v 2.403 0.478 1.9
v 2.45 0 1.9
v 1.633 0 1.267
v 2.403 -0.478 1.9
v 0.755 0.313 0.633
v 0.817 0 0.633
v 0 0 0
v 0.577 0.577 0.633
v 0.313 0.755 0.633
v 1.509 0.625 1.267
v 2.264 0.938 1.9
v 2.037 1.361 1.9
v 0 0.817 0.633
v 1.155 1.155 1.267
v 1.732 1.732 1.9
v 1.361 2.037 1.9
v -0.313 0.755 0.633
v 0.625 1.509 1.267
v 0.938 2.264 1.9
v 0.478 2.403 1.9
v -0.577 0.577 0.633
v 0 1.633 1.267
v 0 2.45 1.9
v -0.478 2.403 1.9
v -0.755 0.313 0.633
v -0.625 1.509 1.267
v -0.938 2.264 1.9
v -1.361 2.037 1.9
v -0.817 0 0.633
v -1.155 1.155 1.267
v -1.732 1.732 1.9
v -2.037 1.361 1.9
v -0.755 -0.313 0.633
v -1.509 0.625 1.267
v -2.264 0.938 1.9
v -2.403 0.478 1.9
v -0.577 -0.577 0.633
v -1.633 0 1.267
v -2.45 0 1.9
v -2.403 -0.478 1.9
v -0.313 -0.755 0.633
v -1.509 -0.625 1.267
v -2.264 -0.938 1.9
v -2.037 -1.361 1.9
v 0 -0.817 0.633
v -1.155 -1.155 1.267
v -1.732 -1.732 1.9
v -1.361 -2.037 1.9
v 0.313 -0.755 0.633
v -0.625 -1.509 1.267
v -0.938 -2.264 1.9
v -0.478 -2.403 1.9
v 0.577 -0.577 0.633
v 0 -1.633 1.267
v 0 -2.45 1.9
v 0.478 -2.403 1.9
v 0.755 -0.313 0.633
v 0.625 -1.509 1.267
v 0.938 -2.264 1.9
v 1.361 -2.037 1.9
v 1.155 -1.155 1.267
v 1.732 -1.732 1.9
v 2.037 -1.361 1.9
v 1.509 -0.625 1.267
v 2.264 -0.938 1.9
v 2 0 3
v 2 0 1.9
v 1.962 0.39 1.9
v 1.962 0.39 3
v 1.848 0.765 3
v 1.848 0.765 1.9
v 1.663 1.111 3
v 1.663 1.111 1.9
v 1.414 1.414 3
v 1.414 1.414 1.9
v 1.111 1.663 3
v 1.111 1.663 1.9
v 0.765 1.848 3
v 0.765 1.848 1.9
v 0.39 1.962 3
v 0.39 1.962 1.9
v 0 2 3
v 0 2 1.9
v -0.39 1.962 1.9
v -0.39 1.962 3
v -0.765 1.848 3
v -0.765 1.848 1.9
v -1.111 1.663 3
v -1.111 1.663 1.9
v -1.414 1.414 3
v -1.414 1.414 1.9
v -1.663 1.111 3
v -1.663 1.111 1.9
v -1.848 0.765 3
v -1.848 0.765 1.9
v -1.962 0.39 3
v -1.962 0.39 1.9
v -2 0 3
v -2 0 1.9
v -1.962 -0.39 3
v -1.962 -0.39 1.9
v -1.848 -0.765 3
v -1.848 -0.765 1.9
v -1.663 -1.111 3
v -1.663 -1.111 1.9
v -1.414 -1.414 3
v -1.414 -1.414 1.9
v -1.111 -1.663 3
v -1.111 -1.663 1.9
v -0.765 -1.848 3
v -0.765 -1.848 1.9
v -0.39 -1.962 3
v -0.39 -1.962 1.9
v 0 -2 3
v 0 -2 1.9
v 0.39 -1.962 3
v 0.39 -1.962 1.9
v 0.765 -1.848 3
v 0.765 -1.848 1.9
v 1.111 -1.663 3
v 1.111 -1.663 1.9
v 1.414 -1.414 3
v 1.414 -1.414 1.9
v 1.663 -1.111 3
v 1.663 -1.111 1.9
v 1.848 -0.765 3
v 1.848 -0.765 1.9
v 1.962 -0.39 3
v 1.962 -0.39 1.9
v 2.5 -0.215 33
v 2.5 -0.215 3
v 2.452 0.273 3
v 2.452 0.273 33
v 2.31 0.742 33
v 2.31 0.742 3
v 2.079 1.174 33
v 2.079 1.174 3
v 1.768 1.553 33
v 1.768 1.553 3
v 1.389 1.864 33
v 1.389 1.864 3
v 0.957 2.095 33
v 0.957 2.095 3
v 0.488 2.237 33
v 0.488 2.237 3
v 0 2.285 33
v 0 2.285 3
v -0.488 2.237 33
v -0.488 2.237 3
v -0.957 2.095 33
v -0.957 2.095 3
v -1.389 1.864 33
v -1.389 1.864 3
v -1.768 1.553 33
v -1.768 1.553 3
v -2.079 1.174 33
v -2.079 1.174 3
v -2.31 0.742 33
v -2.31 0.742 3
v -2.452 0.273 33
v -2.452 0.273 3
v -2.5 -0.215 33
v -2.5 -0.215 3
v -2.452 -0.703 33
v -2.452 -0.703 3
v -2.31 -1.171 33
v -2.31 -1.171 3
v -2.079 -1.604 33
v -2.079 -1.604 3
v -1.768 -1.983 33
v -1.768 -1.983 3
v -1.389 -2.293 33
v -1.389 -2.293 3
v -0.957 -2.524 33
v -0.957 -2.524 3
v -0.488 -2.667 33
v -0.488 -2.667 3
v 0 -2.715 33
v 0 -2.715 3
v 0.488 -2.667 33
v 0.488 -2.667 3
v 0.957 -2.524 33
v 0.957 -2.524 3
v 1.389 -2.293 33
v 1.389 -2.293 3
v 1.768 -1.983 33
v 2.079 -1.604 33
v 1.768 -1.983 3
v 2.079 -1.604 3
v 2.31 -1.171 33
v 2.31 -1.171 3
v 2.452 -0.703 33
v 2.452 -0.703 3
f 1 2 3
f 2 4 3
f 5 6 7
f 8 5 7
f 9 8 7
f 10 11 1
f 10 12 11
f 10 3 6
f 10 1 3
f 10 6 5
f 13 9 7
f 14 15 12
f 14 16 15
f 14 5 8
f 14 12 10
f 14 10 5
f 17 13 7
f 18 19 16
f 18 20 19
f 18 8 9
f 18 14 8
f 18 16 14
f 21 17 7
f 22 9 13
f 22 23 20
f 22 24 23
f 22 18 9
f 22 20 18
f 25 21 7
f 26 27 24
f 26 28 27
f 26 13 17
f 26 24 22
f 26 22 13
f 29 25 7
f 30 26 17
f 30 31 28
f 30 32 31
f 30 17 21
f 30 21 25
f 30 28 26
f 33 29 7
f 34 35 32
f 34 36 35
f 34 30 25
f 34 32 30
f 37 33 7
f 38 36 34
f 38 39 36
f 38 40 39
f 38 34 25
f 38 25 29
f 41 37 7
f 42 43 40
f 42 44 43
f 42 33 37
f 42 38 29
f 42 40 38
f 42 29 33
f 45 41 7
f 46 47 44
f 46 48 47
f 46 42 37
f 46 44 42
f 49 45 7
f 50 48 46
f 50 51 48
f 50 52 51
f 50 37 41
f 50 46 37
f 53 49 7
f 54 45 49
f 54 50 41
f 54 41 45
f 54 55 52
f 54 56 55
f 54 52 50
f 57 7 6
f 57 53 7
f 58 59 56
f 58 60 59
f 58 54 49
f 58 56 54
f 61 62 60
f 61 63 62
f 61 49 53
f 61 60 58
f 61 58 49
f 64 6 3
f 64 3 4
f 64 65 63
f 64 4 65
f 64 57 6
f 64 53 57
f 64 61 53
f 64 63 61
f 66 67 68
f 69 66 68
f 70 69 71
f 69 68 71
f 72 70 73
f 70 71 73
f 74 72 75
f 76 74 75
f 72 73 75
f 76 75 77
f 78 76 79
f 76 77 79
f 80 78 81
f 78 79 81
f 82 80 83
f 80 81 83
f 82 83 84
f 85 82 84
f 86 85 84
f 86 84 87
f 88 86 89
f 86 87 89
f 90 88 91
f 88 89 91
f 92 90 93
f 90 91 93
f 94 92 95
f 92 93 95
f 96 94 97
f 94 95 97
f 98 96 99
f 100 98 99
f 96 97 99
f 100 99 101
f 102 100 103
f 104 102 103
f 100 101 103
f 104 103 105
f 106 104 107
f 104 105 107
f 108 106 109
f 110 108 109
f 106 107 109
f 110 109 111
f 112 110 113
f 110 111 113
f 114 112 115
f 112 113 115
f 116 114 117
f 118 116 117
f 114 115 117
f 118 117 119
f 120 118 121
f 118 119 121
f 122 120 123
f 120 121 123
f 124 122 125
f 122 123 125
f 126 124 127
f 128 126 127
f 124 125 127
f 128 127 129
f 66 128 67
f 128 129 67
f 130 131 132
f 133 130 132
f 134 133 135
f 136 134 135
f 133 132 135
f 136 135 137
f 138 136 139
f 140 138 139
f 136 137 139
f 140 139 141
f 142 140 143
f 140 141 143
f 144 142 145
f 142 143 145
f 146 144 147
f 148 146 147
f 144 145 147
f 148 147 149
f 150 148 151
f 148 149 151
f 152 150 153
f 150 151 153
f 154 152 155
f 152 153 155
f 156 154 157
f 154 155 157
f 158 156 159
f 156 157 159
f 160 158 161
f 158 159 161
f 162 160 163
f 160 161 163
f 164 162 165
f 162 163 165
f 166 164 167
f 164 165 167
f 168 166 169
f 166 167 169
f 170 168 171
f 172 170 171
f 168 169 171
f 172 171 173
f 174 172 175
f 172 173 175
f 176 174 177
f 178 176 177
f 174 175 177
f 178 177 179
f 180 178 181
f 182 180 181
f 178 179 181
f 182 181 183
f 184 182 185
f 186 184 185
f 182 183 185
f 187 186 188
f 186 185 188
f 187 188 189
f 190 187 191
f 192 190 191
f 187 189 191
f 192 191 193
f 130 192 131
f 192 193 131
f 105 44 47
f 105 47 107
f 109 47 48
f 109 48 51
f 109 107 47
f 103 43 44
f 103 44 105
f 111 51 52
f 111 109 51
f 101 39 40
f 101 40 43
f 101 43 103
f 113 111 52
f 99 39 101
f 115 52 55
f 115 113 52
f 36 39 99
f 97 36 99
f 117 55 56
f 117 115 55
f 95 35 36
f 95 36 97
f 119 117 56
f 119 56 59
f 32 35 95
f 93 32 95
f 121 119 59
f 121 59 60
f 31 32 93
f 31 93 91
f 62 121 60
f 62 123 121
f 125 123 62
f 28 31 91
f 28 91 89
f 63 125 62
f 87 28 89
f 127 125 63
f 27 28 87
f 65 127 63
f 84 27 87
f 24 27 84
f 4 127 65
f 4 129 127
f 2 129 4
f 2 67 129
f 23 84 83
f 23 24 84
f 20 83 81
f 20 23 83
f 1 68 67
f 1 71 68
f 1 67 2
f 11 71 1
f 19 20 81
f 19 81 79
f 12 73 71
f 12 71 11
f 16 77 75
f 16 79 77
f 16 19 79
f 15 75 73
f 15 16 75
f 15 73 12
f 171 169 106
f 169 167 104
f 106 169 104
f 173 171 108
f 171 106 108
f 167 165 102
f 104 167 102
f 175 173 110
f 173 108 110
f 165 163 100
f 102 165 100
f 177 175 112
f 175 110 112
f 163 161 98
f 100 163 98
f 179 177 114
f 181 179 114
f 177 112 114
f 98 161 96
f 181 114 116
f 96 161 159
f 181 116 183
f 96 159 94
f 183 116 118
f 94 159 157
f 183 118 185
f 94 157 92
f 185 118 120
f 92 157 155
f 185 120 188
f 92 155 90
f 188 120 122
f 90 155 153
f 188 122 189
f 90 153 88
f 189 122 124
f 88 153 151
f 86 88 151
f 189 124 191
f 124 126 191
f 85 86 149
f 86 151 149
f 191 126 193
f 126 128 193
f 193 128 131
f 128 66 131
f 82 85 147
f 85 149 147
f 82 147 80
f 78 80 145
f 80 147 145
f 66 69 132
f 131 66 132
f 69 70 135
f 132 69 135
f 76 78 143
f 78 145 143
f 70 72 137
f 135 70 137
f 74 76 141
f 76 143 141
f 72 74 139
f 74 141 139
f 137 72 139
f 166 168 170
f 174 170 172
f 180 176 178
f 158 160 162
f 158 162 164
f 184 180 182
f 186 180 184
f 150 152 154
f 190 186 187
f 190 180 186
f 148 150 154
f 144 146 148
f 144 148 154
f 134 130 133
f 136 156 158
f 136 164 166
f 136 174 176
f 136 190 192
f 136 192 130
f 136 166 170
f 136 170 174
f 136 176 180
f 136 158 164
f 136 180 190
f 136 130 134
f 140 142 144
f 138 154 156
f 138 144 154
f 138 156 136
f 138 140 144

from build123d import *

# Parameters (mm, degrees)
F2_R     = 2
F3_DEPTH = 1.1
F4_R     = 2.5
F5_DEPTH = 30


with BuildPart() as f1:
    # F0 (on Front) → F1 (revolve)
    with BuildSketch(Plane.XZ):
        Polygon((0, 1.9), (0, 0), (2.45, 1.9), align=None)
    revolve(axis=Axis((0, 0, 0.95), (0, 0, 1)))

    # F2 (on face) → F3 (join)
    with BuildSketch(Plane.XY.offset(1.9)):
        Circle(F2_R)
    extrude(amount=F3_DEPTH)

    # F4 (on face) → F5 (join)
    with BuildSketch(Plane.XY.offset(3)):
        with Locations((0, -0.214779)):
            Circle(F4_R)
    extrude(amount=F5_DEPTH)


solid = f1.part
